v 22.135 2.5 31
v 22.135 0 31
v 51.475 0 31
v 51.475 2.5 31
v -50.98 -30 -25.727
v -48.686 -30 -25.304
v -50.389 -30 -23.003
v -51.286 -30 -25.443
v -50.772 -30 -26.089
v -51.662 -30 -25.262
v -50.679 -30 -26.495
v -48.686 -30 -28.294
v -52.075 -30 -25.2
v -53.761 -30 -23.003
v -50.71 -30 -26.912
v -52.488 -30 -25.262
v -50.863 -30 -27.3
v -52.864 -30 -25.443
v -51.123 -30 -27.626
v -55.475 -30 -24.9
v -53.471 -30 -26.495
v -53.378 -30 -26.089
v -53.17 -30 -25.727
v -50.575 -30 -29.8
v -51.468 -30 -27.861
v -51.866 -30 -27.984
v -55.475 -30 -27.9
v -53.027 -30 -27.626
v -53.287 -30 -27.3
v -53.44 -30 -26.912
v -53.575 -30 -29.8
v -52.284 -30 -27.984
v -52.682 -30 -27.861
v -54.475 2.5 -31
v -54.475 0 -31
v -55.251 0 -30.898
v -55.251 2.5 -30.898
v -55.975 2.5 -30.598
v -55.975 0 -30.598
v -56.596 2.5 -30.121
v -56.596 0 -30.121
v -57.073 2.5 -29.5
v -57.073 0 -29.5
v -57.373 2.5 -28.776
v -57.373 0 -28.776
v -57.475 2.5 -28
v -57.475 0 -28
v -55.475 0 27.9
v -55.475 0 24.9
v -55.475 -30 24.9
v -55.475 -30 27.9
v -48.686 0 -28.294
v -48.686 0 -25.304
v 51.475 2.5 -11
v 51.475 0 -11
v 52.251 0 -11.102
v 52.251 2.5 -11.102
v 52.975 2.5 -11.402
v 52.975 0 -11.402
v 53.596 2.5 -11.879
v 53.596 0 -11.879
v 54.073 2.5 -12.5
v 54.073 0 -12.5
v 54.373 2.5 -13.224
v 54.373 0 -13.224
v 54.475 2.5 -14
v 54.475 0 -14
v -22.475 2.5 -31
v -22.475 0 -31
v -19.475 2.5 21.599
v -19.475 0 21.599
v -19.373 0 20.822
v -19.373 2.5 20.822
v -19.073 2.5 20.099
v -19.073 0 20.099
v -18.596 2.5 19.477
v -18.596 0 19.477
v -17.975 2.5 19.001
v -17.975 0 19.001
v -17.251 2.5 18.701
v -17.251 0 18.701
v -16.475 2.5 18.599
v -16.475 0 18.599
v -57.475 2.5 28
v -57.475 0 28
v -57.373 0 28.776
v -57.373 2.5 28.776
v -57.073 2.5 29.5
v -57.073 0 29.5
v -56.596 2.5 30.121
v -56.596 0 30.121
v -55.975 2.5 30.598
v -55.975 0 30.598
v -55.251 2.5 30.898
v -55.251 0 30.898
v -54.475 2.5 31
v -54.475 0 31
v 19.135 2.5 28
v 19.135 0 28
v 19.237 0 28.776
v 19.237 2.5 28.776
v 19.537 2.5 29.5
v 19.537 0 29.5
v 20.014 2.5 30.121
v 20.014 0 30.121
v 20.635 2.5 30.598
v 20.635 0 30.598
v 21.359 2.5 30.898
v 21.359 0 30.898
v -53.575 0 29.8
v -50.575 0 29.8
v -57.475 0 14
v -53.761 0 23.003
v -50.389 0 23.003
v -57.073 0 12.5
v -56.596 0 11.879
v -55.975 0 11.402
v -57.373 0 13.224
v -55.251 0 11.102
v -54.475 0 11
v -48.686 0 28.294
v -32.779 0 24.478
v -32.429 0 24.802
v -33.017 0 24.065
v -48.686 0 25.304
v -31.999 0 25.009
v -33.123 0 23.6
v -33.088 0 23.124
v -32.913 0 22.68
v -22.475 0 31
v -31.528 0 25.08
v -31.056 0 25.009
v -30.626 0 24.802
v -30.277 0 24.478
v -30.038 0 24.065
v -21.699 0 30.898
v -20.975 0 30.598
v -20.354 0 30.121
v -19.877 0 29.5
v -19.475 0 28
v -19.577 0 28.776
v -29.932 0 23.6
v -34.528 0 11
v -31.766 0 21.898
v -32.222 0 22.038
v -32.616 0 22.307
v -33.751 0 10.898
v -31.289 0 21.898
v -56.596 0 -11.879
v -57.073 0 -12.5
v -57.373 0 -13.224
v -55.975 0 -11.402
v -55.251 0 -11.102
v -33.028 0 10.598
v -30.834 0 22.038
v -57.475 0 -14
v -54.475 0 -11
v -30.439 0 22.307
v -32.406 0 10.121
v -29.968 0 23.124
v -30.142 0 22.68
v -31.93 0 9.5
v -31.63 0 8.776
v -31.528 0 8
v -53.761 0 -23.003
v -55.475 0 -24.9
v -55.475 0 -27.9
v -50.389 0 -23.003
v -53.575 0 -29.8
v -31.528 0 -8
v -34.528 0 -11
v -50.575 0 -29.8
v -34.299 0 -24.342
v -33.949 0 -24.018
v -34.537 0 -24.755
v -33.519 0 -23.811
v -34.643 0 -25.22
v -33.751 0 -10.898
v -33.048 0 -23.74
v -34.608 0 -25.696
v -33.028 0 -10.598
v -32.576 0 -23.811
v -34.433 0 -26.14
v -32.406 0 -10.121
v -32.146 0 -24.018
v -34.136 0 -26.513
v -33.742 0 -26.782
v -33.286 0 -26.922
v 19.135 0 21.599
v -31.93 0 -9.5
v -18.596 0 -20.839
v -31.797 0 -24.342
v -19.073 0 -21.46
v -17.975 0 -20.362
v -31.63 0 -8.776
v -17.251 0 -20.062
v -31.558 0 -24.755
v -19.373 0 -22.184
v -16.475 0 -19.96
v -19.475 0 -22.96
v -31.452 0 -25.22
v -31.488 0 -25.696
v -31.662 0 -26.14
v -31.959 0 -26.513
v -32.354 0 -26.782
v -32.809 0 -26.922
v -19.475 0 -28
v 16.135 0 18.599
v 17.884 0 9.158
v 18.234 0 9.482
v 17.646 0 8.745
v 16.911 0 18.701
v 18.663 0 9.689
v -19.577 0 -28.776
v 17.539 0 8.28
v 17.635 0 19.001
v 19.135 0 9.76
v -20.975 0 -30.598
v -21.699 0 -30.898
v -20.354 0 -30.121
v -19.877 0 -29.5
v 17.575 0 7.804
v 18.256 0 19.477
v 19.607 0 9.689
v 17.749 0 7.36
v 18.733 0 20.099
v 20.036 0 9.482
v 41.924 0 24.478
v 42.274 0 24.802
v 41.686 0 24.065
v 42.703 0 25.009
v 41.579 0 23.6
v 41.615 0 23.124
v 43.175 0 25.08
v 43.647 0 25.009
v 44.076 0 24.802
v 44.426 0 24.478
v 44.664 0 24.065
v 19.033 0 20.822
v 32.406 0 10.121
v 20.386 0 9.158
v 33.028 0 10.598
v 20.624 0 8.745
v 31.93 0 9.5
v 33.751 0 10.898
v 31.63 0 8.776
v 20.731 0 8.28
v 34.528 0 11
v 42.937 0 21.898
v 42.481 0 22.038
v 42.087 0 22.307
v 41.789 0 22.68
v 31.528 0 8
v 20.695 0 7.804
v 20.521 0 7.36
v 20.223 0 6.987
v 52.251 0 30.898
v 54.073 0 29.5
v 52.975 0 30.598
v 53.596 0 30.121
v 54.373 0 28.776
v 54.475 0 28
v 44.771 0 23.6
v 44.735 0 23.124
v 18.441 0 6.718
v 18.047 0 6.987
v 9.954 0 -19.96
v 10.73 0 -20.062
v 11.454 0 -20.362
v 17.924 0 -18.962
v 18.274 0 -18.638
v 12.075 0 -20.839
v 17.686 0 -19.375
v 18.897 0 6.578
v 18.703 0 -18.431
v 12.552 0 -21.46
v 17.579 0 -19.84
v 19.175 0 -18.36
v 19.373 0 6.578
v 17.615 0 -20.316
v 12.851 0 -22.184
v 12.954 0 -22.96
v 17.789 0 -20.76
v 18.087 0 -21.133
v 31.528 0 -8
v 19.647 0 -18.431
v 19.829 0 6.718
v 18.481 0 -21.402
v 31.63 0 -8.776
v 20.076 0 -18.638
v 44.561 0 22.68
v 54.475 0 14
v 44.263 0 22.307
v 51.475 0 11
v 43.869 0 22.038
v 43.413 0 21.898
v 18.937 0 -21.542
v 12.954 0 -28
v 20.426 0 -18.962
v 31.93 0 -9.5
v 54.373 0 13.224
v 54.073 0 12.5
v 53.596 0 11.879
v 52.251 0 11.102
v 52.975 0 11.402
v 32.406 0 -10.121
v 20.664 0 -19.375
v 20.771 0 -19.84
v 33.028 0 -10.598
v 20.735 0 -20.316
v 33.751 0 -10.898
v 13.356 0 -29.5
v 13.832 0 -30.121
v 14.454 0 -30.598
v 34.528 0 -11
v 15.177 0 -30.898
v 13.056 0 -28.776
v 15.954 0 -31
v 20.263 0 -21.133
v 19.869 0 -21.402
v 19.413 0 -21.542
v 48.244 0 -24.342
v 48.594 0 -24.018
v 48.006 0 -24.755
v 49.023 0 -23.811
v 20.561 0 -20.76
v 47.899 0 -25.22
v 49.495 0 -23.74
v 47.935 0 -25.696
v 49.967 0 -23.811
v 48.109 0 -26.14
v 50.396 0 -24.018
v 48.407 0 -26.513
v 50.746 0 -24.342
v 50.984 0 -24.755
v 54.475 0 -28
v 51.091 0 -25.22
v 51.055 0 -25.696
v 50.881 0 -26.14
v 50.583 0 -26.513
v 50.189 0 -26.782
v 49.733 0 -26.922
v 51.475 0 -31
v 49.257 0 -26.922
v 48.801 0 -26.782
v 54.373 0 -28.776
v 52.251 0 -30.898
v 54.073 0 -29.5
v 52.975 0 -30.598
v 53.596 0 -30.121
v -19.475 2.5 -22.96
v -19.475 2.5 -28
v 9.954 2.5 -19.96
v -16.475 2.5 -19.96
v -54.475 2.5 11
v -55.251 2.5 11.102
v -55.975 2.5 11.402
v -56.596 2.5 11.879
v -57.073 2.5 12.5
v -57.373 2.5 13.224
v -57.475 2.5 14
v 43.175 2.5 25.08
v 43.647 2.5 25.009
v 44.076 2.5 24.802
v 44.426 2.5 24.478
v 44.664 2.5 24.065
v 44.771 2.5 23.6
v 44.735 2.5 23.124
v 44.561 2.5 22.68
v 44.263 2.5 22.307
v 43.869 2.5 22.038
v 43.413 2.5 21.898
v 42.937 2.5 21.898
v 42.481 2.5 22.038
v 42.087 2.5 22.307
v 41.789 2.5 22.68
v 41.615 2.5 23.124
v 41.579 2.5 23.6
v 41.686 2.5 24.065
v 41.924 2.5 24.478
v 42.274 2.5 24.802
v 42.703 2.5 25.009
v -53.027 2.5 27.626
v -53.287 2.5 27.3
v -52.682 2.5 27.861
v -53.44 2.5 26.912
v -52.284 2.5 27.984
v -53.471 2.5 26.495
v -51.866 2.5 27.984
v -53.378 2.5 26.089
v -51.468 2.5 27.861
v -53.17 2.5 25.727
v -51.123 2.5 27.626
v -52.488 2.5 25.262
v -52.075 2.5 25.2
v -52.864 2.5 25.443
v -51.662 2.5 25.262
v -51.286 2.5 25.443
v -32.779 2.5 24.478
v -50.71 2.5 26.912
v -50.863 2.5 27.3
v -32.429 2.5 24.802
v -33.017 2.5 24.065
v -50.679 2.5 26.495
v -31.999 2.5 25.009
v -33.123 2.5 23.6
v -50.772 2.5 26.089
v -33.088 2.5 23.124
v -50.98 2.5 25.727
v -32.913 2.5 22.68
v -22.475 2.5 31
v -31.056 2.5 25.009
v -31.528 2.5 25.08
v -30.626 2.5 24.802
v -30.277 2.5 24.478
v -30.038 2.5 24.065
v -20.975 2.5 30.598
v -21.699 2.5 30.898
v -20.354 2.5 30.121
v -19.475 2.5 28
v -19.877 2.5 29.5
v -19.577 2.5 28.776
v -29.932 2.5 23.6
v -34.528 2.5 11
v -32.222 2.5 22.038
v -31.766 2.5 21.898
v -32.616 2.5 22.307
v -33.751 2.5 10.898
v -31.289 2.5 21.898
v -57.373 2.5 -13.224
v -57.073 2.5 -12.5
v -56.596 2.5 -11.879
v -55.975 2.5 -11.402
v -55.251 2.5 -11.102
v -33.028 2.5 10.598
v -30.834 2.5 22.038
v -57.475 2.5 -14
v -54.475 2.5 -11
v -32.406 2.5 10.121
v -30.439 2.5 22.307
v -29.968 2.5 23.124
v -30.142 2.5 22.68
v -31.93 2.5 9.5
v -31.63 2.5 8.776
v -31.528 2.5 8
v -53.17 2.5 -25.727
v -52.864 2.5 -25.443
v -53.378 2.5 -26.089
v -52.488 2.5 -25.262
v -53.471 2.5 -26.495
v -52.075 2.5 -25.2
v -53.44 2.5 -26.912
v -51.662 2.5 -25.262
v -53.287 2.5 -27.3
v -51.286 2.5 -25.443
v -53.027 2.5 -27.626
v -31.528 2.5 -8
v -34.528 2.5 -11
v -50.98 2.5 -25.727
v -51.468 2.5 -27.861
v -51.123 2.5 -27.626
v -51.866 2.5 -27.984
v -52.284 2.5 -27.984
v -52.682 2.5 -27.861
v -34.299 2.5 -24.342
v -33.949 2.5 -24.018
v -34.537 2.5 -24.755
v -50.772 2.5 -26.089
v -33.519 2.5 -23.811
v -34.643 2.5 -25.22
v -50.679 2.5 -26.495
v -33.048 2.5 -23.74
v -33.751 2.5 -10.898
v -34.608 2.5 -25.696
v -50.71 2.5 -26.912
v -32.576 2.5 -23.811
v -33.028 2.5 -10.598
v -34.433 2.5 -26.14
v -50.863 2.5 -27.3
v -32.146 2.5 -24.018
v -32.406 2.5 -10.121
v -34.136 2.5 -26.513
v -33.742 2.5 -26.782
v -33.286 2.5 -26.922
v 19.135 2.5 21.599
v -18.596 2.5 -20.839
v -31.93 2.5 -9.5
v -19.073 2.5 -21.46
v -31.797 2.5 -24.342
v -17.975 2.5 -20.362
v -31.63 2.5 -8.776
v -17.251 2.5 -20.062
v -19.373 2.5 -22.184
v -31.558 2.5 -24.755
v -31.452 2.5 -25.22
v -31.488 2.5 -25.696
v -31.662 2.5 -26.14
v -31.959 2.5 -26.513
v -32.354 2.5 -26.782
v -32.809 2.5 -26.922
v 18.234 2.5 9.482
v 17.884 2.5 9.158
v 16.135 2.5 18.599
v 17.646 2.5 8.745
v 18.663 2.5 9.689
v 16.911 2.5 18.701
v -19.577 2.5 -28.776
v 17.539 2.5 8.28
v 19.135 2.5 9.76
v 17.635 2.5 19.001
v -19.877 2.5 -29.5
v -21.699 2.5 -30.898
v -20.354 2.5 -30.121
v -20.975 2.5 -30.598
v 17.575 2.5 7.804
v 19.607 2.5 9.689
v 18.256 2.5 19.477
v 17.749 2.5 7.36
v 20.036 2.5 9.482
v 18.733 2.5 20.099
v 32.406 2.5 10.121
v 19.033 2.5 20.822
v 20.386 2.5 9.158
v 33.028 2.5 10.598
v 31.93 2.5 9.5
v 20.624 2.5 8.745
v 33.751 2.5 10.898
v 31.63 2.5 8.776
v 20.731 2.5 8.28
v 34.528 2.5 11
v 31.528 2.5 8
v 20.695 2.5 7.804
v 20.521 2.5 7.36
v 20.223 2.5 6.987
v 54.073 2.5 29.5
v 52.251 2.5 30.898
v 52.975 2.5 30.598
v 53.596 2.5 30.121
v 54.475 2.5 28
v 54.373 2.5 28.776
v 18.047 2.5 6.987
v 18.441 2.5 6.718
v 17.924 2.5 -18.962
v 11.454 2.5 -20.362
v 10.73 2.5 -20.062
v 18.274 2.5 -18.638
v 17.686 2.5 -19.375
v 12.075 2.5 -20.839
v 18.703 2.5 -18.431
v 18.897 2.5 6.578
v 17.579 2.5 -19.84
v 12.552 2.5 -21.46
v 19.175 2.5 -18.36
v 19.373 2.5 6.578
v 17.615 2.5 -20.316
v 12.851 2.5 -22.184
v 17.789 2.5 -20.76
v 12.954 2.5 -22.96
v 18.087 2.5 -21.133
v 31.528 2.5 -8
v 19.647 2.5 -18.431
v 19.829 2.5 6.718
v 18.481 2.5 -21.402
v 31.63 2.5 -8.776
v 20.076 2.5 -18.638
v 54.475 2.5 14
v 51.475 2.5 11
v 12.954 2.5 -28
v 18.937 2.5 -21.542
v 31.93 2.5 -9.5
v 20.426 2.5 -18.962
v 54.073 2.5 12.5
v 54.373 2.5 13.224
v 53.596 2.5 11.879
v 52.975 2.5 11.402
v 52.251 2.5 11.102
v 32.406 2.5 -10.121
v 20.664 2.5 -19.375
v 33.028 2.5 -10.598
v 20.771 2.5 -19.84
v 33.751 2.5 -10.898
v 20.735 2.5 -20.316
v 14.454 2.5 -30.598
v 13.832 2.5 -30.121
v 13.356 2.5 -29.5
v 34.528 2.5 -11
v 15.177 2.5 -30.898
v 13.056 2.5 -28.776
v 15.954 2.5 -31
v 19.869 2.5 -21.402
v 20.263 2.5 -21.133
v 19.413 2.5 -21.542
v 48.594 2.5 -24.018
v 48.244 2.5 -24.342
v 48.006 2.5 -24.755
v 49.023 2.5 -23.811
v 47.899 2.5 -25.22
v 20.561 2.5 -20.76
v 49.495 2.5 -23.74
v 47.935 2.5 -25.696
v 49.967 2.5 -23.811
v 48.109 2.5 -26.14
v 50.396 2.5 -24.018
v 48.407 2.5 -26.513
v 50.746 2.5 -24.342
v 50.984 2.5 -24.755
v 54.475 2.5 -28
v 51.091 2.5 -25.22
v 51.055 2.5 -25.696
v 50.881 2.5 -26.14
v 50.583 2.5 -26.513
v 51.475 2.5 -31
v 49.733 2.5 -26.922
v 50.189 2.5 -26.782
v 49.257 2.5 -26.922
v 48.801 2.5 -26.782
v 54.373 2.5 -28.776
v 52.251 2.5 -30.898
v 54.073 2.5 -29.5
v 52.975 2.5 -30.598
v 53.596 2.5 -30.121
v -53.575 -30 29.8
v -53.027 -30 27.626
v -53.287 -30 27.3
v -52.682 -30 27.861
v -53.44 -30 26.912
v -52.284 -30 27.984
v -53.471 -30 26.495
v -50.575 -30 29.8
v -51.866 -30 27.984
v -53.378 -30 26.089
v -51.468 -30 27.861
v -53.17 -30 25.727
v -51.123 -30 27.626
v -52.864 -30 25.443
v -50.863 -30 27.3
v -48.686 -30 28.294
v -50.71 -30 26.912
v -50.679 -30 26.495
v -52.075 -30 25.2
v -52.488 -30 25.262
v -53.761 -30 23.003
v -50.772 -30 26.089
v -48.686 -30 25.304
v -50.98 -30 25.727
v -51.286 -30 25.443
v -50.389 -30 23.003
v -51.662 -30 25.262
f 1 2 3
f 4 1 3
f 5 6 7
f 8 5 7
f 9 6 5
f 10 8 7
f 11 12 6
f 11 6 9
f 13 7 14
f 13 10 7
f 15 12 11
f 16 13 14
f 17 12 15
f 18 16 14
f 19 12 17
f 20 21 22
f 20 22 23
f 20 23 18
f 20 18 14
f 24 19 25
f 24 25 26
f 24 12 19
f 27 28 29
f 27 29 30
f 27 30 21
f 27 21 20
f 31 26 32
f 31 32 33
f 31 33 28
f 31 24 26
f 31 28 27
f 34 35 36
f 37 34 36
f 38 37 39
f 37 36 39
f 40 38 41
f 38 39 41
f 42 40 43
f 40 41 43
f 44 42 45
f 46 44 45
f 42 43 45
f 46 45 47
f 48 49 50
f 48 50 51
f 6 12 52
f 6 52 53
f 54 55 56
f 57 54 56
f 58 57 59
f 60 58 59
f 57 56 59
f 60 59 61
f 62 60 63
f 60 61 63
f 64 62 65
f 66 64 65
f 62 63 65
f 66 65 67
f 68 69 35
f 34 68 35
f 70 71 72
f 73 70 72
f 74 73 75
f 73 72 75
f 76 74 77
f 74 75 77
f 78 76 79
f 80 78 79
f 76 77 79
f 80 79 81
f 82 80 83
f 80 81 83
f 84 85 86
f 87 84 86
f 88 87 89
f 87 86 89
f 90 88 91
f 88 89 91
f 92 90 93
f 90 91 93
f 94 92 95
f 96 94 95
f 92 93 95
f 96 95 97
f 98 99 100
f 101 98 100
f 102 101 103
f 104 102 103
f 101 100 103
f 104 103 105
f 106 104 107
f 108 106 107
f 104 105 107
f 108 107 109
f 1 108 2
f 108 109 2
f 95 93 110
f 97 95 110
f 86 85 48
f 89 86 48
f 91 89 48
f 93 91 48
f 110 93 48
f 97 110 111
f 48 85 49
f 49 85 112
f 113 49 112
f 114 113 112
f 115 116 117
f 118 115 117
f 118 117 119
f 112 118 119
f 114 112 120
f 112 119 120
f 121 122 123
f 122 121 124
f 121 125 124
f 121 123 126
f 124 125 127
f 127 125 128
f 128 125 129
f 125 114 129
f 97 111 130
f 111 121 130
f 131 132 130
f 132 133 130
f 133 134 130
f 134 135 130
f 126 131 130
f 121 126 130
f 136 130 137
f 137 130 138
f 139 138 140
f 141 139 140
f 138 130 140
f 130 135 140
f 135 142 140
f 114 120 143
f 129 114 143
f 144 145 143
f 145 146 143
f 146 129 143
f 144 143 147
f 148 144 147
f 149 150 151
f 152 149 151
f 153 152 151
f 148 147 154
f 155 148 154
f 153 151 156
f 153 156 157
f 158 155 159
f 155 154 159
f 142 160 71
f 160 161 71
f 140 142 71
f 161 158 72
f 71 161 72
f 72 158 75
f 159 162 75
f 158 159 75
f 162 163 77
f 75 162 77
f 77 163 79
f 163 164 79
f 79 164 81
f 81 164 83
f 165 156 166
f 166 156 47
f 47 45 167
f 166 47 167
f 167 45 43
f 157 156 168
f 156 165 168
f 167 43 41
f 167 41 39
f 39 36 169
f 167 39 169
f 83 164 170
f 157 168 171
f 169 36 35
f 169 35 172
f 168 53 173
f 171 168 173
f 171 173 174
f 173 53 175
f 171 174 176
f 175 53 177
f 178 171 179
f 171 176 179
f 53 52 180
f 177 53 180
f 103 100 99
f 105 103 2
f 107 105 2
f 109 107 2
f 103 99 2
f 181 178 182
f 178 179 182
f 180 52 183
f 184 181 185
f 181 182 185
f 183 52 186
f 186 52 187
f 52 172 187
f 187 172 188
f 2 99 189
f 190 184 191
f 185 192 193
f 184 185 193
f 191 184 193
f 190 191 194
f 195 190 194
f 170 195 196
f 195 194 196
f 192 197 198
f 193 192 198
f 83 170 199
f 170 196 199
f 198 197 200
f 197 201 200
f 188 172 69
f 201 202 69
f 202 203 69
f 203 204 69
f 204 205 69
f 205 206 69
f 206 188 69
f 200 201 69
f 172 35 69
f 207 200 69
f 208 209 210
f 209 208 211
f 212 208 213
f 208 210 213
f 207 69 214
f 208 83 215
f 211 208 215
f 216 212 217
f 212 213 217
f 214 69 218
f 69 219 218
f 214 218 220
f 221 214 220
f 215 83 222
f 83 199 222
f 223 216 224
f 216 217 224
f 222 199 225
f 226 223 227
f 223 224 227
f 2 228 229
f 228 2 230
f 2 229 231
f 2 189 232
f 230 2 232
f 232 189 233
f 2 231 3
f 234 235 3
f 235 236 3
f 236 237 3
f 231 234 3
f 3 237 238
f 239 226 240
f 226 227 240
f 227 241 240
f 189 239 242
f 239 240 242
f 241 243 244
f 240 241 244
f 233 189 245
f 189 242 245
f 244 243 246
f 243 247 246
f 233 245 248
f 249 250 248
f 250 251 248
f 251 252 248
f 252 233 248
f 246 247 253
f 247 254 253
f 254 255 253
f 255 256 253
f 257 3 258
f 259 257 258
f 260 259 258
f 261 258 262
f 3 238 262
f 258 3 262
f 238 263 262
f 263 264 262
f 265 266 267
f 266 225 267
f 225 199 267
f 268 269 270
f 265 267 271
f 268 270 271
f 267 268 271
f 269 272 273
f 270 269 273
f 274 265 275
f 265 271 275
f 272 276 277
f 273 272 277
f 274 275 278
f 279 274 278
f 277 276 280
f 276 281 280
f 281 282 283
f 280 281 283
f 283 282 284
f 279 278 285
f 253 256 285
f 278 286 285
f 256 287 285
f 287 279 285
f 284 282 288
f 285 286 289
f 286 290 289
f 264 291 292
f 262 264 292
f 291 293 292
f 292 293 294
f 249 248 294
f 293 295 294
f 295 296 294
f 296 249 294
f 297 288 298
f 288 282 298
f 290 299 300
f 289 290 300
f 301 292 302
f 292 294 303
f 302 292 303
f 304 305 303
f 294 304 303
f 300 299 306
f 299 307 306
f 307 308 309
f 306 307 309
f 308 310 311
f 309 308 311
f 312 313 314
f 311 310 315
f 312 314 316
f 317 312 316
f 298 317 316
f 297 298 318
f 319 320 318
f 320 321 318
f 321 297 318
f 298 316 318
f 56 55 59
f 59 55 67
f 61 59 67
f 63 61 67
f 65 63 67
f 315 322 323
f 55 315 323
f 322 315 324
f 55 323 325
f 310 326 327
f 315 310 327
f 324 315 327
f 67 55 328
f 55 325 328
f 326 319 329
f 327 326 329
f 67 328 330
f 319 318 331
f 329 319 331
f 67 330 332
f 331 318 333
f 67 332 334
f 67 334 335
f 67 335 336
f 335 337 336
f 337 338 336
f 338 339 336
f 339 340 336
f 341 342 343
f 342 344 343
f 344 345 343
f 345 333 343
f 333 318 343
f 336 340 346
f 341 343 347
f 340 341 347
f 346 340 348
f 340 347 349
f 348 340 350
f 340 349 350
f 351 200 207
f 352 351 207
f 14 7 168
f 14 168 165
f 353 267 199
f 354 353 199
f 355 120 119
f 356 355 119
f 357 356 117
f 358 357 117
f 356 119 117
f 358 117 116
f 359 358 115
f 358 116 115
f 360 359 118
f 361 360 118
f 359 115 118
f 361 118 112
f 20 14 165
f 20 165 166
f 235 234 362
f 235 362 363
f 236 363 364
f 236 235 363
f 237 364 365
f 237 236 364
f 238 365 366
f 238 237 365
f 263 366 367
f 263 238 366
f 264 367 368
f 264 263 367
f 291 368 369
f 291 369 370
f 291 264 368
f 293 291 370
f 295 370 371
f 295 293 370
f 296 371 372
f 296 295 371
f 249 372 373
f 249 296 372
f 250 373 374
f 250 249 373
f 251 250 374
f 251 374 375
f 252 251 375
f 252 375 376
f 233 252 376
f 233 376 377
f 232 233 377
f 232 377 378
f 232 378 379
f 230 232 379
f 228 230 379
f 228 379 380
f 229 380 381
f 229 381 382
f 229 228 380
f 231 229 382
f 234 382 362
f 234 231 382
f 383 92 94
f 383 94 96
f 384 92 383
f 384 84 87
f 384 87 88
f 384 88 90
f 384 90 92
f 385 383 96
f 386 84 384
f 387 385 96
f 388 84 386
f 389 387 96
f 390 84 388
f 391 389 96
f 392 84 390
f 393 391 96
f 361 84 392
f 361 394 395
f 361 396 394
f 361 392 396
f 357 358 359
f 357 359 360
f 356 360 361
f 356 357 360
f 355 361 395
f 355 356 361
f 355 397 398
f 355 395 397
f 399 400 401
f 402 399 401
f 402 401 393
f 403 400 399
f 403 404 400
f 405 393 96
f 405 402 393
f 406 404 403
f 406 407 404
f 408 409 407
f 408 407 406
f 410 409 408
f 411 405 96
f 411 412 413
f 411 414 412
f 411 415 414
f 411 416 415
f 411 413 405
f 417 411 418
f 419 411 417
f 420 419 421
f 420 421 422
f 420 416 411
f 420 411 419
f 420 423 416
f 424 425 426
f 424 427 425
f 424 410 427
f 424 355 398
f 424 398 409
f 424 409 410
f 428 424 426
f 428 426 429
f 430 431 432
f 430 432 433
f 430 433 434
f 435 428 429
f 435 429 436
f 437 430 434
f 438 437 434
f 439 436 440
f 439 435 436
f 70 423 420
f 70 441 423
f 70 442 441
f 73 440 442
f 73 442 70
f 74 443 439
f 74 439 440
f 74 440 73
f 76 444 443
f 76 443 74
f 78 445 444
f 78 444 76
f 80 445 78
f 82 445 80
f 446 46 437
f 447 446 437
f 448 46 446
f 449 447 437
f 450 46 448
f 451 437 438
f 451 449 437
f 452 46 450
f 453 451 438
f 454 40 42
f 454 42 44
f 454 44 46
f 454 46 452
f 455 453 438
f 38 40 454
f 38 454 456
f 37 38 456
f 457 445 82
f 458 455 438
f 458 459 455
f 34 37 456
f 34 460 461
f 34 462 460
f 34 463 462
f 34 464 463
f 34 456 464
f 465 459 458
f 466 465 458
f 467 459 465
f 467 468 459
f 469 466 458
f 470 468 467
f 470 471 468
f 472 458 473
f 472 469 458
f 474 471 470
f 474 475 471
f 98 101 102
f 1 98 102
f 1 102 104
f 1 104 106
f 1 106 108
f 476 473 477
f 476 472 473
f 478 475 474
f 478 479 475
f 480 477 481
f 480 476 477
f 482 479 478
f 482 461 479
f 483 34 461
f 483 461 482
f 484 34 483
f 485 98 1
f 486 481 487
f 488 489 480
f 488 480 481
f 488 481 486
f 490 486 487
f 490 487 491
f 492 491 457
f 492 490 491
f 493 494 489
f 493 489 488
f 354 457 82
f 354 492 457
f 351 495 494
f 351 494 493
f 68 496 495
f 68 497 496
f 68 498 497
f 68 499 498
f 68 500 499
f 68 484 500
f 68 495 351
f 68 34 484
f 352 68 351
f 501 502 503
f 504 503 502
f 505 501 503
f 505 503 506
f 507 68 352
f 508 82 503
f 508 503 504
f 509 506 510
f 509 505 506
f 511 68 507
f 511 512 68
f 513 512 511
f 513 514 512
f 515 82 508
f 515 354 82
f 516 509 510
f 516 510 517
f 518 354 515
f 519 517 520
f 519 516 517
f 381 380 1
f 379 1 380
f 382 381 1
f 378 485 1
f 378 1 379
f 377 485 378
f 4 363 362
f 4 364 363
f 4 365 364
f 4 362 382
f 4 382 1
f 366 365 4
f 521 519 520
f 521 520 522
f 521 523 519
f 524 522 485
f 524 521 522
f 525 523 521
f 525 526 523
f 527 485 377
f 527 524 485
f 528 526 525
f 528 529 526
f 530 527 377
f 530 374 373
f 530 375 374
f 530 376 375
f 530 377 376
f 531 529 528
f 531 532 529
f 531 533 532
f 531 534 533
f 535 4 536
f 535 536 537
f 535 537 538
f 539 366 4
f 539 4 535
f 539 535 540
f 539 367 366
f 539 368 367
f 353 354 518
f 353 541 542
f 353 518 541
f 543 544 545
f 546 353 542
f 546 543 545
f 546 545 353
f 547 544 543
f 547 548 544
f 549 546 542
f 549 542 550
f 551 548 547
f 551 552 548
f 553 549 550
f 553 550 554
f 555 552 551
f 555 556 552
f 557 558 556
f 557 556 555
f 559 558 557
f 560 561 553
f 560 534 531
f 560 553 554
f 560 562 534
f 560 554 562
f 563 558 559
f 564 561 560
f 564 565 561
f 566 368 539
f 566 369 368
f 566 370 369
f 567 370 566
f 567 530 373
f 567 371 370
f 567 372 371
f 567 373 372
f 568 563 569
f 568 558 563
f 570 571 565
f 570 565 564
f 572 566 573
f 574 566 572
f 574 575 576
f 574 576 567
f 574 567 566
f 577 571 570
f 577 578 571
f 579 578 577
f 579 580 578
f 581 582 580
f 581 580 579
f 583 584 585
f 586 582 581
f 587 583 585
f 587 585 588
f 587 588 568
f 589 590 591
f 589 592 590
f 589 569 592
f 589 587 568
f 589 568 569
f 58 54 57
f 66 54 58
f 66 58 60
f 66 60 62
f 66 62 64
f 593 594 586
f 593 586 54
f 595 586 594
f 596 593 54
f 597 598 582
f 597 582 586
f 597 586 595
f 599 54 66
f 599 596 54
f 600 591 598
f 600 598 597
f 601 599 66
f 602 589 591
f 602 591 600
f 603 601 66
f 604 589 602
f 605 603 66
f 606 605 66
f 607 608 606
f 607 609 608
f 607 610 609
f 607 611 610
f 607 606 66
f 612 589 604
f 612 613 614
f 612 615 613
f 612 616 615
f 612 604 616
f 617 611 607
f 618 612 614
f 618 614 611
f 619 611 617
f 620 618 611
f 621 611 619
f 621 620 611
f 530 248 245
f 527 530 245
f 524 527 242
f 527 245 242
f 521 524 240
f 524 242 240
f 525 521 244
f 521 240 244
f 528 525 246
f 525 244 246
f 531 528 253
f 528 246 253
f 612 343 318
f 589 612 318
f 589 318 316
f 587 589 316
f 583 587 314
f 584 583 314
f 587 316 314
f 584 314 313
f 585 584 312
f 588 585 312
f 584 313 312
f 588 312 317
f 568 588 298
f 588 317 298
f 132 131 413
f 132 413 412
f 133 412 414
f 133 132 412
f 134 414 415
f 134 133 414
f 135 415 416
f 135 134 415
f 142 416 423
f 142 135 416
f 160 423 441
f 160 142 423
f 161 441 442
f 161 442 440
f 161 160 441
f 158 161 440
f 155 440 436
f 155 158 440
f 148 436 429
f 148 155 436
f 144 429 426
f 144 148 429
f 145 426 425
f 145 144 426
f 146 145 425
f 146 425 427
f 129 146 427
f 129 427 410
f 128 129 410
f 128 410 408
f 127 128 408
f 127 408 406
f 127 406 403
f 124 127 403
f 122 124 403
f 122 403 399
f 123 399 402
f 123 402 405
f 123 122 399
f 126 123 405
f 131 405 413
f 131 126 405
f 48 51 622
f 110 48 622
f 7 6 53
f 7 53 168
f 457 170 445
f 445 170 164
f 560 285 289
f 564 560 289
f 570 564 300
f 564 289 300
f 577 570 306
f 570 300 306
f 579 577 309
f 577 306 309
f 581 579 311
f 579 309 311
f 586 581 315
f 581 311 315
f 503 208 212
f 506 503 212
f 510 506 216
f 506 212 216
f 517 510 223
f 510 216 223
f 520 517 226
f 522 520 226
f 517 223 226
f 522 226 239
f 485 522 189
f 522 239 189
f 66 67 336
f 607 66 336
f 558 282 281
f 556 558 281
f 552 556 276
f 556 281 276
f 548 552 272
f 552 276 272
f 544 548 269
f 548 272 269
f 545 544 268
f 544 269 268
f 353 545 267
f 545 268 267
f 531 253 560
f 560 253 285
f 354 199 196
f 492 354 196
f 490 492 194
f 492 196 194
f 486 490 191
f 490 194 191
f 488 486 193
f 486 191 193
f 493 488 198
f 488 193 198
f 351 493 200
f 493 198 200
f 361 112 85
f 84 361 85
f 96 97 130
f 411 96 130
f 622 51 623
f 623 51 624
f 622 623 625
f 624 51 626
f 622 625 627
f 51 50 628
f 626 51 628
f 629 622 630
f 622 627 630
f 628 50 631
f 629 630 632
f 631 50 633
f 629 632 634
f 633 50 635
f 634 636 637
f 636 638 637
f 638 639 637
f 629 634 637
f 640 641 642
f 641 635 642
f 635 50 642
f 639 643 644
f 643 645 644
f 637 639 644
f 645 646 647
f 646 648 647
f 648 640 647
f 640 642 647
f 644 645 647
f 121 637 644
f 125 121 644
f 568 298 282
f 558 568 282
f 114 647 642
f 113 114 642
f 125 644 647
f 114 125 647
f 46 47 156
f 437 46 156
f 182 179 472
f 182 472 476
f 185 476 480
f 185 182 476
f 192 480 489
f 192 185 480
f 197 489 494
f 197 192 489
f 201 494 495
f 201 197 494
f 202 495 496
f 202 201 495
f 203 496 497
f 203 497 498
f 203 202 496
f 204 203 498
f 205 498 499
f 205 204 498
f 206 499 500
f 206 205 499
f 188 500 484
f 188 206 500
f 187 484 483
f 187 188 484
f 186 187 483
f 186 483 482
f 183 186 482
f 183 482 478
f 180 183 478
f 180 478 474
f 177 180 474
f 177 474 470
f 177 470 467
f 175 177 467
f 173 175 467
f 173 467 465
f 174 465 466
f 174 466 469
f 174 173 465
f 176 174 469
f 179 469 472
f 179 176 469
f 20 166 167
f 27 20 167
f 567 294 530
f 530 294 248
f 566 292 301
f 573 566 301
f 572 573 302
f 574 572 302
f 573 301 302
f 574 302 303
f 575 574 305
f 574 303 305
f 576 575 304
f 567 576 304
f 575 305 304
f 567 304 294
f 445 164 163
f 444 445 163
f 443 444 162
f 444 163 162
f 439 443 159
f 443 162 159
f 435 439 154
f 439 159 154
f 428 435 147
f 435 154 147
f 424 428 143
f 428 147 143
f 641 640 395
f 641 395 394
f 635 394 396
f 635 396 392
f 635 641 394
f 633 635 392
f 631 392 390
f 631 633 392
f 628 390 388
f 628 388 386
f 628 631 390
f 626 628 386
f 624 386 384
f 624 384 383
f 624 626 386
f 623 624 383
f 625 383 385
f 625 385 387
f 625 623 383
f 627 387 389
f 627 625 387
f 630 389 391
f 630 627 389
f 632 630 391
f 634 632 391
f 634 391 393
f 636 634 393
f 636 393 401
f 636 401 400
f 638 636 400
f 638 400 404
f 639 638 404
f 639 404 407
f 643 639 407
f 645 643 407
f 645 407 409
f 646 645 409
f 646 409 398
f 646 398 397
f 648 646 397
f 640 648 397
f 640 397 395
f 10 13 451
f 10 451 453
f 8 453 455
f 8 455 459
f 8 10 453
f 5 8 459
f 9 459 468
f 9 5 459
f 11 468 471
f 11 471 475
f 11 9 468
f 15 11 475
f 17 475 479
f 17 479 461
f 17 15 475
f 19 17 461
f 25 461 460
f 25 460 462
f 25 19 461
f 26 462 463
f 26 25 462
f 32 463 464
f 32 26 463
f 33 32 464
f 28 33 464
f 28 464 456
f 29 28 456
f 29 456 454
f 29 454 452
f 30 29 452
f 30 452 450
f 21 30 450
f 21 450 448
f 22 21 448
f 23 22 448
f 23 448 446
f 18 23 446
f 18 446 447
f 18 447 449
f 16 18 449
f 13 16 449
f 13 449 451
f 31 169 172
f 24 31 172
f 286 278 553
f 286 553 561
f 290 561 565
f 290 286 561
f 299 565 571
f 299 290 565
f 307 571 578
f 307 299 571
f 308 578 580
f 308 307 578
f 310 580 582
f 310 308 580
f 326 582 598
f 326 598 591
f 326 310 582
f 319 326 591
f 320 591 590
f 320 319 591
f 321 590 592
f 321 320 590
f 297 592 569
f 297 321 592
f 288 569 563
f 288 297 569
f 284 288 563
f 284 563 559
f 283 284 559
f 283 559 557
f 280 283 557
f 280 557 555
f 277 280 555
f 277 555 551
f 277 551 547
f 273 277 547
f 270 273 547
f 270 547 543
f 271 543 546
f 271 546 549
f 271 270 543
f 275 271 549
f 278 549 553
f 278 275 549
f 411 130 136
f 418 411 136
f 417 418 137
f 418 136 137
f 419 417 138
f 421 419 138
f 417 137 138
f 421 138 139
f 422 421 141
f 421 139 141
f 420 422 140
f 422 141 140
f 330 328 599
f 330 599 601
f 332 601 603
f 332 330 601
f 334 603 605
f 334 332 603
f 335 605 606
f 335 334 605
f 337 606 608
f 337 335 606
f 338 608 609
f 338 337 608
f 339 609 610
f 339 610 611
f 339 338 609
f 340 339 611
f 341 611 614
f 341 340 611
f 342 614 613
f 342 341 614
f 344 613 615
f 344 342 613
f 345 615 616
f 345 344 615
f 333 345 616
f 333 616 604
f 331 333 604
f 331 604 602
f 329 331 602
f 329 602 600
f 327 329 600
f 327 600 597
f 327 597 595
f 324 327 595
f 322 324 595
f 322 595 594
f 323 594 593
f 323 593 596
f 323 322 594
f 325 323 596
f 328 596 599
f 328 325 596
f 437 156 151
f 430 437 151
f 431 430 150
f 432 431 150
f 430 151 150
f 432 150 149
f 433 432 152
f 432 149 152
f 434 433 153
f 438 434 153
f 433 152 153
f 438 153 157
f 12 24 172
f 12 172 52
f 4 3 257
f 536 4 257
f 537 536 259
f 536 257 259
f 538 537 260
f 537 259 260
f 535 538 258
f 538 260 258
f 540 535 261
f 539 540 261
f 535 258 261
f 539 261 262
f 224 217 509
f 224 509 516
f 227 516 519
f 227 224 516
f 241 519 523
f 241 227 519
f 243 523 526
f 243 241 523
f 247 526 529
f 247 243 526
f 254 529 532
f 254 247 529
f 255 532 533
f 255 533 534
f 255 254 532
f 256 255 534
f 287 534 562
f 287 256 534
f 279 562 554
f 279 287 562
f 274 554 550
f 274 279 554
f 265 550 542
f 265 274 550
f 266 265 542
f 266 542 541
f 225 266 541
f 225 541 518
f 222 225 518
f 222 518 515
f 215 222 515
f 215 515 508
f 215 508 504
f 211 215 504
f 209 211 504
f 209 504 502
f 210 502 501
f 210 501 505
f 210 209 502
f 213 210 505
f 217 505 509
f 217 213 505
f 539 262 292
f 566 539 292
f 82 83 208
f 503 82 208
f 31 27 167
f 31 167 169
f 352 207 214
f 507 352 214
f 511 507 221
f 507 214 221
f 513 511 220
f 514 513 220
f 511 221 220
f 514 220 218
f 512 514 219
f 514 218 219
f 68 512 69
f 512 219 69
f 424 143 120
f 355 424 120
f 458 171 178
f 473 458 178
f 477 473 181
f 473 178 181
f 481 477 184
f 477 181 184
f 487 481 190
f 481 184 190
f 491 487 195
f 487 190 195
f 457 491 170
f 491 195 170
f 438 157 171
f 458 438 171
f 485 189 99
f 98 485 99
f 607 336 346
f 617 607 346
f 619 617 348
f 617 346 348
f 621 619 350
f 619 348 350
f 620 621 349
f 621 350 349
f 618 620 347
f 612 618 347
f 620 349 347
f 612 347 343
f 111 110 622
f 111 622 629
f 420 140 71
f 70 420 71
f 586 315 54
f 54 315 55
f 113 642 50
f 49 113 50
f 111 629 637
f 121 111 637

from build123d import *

# Parameters (mm, degrees)
CROQUIS1_R              = 1.6
CROQUIS1_R_2            = 1.4
SALIENTE_EXTRUIR1_DEPTH = 2.5
SALIENTE_EXTRUIR2_START = -32.5
CROQUIS2_R              = 1.4
SALIENTE_EXTRUIR2_DEPTH = 32.5


with BuildPart() as part:
    # Croquis1 → Saliente-Extruir1 (new body)
    with BuildSketch(Plane(origin=(0, 0, 0), x_dir=(1, 0, 0), z_dir=(0, 1, 0))):
        with BuildLine():
            Line((-54.475, -31), (-22.475, -31))
            ThreePointArc((-22.475, -31), (-20.353679656, -30.121320344), (-19.475, -28))
            Line((-19.475, -28), (-19.475, -21.598648019))
            ThreePointArc((-19.475, -21.598648019), (-18.596320344, -19.477327676), (-16.475, -18.598648019))
            Line((-16.475, -18.598648019), (16.135, -18.598648019))
            ThreePointArc((16.135, -18.598648019), (18.256320344, -19.477327676), (19.135, -21.598648019))
            Line((19.135, -21.598648019), (19.135, -28))
            ThreePointArc((19.135, -28), (20.013679656, -30.121320344), (22.135, -31))
            Line((22.135, -31), (51.475, -31))
            ThreePointArc((51.475, -31), (53.596320344, -30.121320344), (54.475, -28))
            Line((54.475, -28), (54.475, -14))
            ThreePointArc((54.475, -14), (53.596320344, -11.878679656), (51.475, -11))
            Line((51.475, -11), (34.52775179, -11))
            ThreePointArc((34.52775179, -11), (32.406431446, -10.121320344), (31.52775179, -8))
            Line((31.52775179, -8), (31.52775179, 8))
            ThreePointArc((31.52775179, 8), (32.406431446, 10.121320344), (34.52775179, 11))
            Line((34.52775179, 11), (51.475, 11))
            ThreePointArc((51.475, 11), (53.596320344, 11.878679656), (54.475, 14))
            Line((54.475, 14), (54.475, 28))
            ThreePointArc((54.475, 28), (53.596320344, 30.121320344), (51.475, 31))
            Line((51.475, 31), (15.953577615, 31))
            ThreePointArc((15.953577615, 31), (13.832257271, 30.121320344), (12.953577615, 28))
            Line((12.953577615, 28), (12.953577615, 22.9600001))
            ThreePointArc((12.953577615, 22.9600001), (12.074897958, 20.838679756), (9.953577615, 19.9600001))
            Line((9.953577615, 19.9600001), (-16.475, 19.9600001))
            ThreePointArc((-16.475, 19.9600001), (-18.596320344, 20.838679756), (-19.475, 22.9600001))
            Line((-19.475, 22.9600001), (-19.475, 28))
            ThreePointArc((-19.475, 28), (-20.353679656, 30.121320344), (-22.475, 31))
            Line((-22.475, 31), (-54.475, 31))
            ThreePointArc((-54.475, 31), (-56.596320344, 30.121320344), (-57.475, 28))
            Line((-57.475, 28), (-57.475, 14))
            ThreePointArc((-57.475, 14), (-56.596320344, 11.878679656), (-54.475, 11))
            Line((-54.475, 11), (-34.52775179, 11))
            ThreePointArc((-34.52775179, 11), (-32.406431446, 10.121320344), (-31.52775179, 8))
            Line((-31.52775179, 8), (-31.52775179, -8))
            ThreePointArc((-31.52775179, -8), (-32.406431446, -10.121320344), (-34.52775179, -11))
            Line((-34.52775179, -11), (-54.475, -11))
            ThreePointArc((-54.475, -11), (-56.596320344, -11.878679656), (-57.475, -14))
            Line((-57.475, -14), (-57.475, -28))
            ThreePointArc((-57.475, -28), (-56.596320344, -30.121320344), (-54.475, -31))
        make_face()
        with Locations(Location((49.495, 25.3400001, 0), (0, 0, 270))):
            Circle(CROQUIS1_R, mode=Mode.SUBTRACT)
        with Locations(Location((-52.075, 26.6, 0), (0, 0, 270))):
            Circle(CROQUIS1_R_2, mode=Mode.SUBTRACT)
        with Locations(Location((-52.075, -26.6, 0), (0, 0, 90))):
            Circle(CROQUIS1_R_2, mode=Mode.SUBTRACT)
        with Locations(Location((-33.04775179, 25.3400001, 0), (0, 0, 270))):
            Circle(CROQUIS1_R, mode=Mode.SUBTRACT)
        with Locations(Location((19.175, 19.9600001, 0), (0, 0, 270))):
            Circle(CROQUIS1_R, mode=Mode.SUBTRACT)
        with Locations(Location((43.175, -23.4799999, 0), (0, 0, 270))):
            Circle(CROQUIS1_R, mode=Mode.SUBTRACT)
        with Locations(Location((-31.52775179, -23.4799999, 0), (0, 0, 270))):
            Circle(CROQUIS1_R, mode=Mode.SUBTRACT)
        with Locations(Location((19.135, -8.1599999, 0), (0, 0, 270))):
            Circle(CROQUIS1_R, mode=Mode.SUBTRACT)
    extrude(amount=SALIENTE_EXTRUIR1_DEPTH)

    # Croquis2 → Saliente-Extruir2 (add)
    # profile 1 of 2: a face of its own
    with BuildSketch(Plane(origin=(0, 2.5, 0), x_dir=(1, 0, 0), z_dir=(0, 1, 0)).offset(SALIENTE_EXTRUIR2_START)):
        Polygon((-55.475, 27.9), (-53.575, 29.8), (-50.575, 29.8), (-48.686440257, 28.294279871), (-48.686440257, 25.304374216), (-50.388696536, 23.00255261), (-53.761303464, 23.00255261), (-55.475, 24.9), align=None)
        with Locations(Location((-52.075, 26.6, 0), (0, 0, 270))):
            Circle(CROQUIS2_R, mode=Mode.SUBTRACT)
    # profile 2 of 2: a face of its own
    with BuildSketch(Plane(origin=(0, 2.5, 0), x_dir=(1, 0, 0), z_dir=(0, 1, 0)).offset(SALIENTE_EXTRUIR2_START)):
        Polygon((-55.475, -27.9), (-53.575, -29.8), (-50.575, -29.8), (-48.686440257, -28.294279871), (-48.686440257, -25.304374216), (-50.388696536, -23.00255261), (-53.761303464, -23.00255261), (-55.475, -24.9), align=None)
        with Locations(Location((-52.075, -26.6, 0), (0, 0, 90))):
            Circle(CROQUIS2_R, mode=Mode.SUBTRACT)
    extrude(amount=SALIENTE_EXTRUIR2_DEPTH)


solid = part.part
